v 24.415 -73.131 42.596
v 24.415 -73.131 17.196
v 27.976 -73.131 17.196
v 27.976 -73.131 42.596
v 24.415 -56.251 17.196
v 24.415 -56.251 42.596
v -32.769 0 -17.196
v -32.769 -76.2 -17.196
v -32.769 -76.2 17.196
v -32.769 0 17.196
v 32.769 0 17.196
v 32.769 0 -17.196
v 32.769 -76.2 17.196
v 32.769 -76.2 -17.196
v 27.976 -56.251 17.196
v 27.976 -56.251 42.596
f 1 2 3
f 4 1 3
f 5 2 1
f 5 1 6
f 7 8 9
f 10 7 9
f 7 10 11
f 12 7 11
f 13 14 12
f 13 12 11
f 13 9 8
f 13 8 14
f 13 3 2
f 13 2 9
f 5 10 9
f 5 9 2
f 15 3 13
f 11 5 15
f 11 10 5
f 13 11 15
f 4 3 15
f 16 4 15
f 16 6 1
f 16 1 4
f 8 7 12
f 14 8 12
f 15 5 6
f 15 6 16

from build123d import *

# Parameters (mm, degrees)
F0_W     = 65.53819
F0_H     = 34.391328
F1_DEPTH = 76.2
F2_W     = 3.561789
F2_H     = 16.879741
F3_DEPTH = 25.4


with BuildPart() as f1:
    # F0 (on Front) → F1 (new body)
    with BuildSketch(Plane.XZ):
        Rectangle(F0_W, F0_H)
    extrude(amount=F1_DEPTH)

    # F2 (on face) → F3 (join)
    with BuildSketch(Plane.XY.offset(17.195664)):
        with Locations((26.195521, -64.690722)):
            Rectangle(F2_W, F2_H)
    extrude(amount=F3_DEPTH)


solid = f1.part
